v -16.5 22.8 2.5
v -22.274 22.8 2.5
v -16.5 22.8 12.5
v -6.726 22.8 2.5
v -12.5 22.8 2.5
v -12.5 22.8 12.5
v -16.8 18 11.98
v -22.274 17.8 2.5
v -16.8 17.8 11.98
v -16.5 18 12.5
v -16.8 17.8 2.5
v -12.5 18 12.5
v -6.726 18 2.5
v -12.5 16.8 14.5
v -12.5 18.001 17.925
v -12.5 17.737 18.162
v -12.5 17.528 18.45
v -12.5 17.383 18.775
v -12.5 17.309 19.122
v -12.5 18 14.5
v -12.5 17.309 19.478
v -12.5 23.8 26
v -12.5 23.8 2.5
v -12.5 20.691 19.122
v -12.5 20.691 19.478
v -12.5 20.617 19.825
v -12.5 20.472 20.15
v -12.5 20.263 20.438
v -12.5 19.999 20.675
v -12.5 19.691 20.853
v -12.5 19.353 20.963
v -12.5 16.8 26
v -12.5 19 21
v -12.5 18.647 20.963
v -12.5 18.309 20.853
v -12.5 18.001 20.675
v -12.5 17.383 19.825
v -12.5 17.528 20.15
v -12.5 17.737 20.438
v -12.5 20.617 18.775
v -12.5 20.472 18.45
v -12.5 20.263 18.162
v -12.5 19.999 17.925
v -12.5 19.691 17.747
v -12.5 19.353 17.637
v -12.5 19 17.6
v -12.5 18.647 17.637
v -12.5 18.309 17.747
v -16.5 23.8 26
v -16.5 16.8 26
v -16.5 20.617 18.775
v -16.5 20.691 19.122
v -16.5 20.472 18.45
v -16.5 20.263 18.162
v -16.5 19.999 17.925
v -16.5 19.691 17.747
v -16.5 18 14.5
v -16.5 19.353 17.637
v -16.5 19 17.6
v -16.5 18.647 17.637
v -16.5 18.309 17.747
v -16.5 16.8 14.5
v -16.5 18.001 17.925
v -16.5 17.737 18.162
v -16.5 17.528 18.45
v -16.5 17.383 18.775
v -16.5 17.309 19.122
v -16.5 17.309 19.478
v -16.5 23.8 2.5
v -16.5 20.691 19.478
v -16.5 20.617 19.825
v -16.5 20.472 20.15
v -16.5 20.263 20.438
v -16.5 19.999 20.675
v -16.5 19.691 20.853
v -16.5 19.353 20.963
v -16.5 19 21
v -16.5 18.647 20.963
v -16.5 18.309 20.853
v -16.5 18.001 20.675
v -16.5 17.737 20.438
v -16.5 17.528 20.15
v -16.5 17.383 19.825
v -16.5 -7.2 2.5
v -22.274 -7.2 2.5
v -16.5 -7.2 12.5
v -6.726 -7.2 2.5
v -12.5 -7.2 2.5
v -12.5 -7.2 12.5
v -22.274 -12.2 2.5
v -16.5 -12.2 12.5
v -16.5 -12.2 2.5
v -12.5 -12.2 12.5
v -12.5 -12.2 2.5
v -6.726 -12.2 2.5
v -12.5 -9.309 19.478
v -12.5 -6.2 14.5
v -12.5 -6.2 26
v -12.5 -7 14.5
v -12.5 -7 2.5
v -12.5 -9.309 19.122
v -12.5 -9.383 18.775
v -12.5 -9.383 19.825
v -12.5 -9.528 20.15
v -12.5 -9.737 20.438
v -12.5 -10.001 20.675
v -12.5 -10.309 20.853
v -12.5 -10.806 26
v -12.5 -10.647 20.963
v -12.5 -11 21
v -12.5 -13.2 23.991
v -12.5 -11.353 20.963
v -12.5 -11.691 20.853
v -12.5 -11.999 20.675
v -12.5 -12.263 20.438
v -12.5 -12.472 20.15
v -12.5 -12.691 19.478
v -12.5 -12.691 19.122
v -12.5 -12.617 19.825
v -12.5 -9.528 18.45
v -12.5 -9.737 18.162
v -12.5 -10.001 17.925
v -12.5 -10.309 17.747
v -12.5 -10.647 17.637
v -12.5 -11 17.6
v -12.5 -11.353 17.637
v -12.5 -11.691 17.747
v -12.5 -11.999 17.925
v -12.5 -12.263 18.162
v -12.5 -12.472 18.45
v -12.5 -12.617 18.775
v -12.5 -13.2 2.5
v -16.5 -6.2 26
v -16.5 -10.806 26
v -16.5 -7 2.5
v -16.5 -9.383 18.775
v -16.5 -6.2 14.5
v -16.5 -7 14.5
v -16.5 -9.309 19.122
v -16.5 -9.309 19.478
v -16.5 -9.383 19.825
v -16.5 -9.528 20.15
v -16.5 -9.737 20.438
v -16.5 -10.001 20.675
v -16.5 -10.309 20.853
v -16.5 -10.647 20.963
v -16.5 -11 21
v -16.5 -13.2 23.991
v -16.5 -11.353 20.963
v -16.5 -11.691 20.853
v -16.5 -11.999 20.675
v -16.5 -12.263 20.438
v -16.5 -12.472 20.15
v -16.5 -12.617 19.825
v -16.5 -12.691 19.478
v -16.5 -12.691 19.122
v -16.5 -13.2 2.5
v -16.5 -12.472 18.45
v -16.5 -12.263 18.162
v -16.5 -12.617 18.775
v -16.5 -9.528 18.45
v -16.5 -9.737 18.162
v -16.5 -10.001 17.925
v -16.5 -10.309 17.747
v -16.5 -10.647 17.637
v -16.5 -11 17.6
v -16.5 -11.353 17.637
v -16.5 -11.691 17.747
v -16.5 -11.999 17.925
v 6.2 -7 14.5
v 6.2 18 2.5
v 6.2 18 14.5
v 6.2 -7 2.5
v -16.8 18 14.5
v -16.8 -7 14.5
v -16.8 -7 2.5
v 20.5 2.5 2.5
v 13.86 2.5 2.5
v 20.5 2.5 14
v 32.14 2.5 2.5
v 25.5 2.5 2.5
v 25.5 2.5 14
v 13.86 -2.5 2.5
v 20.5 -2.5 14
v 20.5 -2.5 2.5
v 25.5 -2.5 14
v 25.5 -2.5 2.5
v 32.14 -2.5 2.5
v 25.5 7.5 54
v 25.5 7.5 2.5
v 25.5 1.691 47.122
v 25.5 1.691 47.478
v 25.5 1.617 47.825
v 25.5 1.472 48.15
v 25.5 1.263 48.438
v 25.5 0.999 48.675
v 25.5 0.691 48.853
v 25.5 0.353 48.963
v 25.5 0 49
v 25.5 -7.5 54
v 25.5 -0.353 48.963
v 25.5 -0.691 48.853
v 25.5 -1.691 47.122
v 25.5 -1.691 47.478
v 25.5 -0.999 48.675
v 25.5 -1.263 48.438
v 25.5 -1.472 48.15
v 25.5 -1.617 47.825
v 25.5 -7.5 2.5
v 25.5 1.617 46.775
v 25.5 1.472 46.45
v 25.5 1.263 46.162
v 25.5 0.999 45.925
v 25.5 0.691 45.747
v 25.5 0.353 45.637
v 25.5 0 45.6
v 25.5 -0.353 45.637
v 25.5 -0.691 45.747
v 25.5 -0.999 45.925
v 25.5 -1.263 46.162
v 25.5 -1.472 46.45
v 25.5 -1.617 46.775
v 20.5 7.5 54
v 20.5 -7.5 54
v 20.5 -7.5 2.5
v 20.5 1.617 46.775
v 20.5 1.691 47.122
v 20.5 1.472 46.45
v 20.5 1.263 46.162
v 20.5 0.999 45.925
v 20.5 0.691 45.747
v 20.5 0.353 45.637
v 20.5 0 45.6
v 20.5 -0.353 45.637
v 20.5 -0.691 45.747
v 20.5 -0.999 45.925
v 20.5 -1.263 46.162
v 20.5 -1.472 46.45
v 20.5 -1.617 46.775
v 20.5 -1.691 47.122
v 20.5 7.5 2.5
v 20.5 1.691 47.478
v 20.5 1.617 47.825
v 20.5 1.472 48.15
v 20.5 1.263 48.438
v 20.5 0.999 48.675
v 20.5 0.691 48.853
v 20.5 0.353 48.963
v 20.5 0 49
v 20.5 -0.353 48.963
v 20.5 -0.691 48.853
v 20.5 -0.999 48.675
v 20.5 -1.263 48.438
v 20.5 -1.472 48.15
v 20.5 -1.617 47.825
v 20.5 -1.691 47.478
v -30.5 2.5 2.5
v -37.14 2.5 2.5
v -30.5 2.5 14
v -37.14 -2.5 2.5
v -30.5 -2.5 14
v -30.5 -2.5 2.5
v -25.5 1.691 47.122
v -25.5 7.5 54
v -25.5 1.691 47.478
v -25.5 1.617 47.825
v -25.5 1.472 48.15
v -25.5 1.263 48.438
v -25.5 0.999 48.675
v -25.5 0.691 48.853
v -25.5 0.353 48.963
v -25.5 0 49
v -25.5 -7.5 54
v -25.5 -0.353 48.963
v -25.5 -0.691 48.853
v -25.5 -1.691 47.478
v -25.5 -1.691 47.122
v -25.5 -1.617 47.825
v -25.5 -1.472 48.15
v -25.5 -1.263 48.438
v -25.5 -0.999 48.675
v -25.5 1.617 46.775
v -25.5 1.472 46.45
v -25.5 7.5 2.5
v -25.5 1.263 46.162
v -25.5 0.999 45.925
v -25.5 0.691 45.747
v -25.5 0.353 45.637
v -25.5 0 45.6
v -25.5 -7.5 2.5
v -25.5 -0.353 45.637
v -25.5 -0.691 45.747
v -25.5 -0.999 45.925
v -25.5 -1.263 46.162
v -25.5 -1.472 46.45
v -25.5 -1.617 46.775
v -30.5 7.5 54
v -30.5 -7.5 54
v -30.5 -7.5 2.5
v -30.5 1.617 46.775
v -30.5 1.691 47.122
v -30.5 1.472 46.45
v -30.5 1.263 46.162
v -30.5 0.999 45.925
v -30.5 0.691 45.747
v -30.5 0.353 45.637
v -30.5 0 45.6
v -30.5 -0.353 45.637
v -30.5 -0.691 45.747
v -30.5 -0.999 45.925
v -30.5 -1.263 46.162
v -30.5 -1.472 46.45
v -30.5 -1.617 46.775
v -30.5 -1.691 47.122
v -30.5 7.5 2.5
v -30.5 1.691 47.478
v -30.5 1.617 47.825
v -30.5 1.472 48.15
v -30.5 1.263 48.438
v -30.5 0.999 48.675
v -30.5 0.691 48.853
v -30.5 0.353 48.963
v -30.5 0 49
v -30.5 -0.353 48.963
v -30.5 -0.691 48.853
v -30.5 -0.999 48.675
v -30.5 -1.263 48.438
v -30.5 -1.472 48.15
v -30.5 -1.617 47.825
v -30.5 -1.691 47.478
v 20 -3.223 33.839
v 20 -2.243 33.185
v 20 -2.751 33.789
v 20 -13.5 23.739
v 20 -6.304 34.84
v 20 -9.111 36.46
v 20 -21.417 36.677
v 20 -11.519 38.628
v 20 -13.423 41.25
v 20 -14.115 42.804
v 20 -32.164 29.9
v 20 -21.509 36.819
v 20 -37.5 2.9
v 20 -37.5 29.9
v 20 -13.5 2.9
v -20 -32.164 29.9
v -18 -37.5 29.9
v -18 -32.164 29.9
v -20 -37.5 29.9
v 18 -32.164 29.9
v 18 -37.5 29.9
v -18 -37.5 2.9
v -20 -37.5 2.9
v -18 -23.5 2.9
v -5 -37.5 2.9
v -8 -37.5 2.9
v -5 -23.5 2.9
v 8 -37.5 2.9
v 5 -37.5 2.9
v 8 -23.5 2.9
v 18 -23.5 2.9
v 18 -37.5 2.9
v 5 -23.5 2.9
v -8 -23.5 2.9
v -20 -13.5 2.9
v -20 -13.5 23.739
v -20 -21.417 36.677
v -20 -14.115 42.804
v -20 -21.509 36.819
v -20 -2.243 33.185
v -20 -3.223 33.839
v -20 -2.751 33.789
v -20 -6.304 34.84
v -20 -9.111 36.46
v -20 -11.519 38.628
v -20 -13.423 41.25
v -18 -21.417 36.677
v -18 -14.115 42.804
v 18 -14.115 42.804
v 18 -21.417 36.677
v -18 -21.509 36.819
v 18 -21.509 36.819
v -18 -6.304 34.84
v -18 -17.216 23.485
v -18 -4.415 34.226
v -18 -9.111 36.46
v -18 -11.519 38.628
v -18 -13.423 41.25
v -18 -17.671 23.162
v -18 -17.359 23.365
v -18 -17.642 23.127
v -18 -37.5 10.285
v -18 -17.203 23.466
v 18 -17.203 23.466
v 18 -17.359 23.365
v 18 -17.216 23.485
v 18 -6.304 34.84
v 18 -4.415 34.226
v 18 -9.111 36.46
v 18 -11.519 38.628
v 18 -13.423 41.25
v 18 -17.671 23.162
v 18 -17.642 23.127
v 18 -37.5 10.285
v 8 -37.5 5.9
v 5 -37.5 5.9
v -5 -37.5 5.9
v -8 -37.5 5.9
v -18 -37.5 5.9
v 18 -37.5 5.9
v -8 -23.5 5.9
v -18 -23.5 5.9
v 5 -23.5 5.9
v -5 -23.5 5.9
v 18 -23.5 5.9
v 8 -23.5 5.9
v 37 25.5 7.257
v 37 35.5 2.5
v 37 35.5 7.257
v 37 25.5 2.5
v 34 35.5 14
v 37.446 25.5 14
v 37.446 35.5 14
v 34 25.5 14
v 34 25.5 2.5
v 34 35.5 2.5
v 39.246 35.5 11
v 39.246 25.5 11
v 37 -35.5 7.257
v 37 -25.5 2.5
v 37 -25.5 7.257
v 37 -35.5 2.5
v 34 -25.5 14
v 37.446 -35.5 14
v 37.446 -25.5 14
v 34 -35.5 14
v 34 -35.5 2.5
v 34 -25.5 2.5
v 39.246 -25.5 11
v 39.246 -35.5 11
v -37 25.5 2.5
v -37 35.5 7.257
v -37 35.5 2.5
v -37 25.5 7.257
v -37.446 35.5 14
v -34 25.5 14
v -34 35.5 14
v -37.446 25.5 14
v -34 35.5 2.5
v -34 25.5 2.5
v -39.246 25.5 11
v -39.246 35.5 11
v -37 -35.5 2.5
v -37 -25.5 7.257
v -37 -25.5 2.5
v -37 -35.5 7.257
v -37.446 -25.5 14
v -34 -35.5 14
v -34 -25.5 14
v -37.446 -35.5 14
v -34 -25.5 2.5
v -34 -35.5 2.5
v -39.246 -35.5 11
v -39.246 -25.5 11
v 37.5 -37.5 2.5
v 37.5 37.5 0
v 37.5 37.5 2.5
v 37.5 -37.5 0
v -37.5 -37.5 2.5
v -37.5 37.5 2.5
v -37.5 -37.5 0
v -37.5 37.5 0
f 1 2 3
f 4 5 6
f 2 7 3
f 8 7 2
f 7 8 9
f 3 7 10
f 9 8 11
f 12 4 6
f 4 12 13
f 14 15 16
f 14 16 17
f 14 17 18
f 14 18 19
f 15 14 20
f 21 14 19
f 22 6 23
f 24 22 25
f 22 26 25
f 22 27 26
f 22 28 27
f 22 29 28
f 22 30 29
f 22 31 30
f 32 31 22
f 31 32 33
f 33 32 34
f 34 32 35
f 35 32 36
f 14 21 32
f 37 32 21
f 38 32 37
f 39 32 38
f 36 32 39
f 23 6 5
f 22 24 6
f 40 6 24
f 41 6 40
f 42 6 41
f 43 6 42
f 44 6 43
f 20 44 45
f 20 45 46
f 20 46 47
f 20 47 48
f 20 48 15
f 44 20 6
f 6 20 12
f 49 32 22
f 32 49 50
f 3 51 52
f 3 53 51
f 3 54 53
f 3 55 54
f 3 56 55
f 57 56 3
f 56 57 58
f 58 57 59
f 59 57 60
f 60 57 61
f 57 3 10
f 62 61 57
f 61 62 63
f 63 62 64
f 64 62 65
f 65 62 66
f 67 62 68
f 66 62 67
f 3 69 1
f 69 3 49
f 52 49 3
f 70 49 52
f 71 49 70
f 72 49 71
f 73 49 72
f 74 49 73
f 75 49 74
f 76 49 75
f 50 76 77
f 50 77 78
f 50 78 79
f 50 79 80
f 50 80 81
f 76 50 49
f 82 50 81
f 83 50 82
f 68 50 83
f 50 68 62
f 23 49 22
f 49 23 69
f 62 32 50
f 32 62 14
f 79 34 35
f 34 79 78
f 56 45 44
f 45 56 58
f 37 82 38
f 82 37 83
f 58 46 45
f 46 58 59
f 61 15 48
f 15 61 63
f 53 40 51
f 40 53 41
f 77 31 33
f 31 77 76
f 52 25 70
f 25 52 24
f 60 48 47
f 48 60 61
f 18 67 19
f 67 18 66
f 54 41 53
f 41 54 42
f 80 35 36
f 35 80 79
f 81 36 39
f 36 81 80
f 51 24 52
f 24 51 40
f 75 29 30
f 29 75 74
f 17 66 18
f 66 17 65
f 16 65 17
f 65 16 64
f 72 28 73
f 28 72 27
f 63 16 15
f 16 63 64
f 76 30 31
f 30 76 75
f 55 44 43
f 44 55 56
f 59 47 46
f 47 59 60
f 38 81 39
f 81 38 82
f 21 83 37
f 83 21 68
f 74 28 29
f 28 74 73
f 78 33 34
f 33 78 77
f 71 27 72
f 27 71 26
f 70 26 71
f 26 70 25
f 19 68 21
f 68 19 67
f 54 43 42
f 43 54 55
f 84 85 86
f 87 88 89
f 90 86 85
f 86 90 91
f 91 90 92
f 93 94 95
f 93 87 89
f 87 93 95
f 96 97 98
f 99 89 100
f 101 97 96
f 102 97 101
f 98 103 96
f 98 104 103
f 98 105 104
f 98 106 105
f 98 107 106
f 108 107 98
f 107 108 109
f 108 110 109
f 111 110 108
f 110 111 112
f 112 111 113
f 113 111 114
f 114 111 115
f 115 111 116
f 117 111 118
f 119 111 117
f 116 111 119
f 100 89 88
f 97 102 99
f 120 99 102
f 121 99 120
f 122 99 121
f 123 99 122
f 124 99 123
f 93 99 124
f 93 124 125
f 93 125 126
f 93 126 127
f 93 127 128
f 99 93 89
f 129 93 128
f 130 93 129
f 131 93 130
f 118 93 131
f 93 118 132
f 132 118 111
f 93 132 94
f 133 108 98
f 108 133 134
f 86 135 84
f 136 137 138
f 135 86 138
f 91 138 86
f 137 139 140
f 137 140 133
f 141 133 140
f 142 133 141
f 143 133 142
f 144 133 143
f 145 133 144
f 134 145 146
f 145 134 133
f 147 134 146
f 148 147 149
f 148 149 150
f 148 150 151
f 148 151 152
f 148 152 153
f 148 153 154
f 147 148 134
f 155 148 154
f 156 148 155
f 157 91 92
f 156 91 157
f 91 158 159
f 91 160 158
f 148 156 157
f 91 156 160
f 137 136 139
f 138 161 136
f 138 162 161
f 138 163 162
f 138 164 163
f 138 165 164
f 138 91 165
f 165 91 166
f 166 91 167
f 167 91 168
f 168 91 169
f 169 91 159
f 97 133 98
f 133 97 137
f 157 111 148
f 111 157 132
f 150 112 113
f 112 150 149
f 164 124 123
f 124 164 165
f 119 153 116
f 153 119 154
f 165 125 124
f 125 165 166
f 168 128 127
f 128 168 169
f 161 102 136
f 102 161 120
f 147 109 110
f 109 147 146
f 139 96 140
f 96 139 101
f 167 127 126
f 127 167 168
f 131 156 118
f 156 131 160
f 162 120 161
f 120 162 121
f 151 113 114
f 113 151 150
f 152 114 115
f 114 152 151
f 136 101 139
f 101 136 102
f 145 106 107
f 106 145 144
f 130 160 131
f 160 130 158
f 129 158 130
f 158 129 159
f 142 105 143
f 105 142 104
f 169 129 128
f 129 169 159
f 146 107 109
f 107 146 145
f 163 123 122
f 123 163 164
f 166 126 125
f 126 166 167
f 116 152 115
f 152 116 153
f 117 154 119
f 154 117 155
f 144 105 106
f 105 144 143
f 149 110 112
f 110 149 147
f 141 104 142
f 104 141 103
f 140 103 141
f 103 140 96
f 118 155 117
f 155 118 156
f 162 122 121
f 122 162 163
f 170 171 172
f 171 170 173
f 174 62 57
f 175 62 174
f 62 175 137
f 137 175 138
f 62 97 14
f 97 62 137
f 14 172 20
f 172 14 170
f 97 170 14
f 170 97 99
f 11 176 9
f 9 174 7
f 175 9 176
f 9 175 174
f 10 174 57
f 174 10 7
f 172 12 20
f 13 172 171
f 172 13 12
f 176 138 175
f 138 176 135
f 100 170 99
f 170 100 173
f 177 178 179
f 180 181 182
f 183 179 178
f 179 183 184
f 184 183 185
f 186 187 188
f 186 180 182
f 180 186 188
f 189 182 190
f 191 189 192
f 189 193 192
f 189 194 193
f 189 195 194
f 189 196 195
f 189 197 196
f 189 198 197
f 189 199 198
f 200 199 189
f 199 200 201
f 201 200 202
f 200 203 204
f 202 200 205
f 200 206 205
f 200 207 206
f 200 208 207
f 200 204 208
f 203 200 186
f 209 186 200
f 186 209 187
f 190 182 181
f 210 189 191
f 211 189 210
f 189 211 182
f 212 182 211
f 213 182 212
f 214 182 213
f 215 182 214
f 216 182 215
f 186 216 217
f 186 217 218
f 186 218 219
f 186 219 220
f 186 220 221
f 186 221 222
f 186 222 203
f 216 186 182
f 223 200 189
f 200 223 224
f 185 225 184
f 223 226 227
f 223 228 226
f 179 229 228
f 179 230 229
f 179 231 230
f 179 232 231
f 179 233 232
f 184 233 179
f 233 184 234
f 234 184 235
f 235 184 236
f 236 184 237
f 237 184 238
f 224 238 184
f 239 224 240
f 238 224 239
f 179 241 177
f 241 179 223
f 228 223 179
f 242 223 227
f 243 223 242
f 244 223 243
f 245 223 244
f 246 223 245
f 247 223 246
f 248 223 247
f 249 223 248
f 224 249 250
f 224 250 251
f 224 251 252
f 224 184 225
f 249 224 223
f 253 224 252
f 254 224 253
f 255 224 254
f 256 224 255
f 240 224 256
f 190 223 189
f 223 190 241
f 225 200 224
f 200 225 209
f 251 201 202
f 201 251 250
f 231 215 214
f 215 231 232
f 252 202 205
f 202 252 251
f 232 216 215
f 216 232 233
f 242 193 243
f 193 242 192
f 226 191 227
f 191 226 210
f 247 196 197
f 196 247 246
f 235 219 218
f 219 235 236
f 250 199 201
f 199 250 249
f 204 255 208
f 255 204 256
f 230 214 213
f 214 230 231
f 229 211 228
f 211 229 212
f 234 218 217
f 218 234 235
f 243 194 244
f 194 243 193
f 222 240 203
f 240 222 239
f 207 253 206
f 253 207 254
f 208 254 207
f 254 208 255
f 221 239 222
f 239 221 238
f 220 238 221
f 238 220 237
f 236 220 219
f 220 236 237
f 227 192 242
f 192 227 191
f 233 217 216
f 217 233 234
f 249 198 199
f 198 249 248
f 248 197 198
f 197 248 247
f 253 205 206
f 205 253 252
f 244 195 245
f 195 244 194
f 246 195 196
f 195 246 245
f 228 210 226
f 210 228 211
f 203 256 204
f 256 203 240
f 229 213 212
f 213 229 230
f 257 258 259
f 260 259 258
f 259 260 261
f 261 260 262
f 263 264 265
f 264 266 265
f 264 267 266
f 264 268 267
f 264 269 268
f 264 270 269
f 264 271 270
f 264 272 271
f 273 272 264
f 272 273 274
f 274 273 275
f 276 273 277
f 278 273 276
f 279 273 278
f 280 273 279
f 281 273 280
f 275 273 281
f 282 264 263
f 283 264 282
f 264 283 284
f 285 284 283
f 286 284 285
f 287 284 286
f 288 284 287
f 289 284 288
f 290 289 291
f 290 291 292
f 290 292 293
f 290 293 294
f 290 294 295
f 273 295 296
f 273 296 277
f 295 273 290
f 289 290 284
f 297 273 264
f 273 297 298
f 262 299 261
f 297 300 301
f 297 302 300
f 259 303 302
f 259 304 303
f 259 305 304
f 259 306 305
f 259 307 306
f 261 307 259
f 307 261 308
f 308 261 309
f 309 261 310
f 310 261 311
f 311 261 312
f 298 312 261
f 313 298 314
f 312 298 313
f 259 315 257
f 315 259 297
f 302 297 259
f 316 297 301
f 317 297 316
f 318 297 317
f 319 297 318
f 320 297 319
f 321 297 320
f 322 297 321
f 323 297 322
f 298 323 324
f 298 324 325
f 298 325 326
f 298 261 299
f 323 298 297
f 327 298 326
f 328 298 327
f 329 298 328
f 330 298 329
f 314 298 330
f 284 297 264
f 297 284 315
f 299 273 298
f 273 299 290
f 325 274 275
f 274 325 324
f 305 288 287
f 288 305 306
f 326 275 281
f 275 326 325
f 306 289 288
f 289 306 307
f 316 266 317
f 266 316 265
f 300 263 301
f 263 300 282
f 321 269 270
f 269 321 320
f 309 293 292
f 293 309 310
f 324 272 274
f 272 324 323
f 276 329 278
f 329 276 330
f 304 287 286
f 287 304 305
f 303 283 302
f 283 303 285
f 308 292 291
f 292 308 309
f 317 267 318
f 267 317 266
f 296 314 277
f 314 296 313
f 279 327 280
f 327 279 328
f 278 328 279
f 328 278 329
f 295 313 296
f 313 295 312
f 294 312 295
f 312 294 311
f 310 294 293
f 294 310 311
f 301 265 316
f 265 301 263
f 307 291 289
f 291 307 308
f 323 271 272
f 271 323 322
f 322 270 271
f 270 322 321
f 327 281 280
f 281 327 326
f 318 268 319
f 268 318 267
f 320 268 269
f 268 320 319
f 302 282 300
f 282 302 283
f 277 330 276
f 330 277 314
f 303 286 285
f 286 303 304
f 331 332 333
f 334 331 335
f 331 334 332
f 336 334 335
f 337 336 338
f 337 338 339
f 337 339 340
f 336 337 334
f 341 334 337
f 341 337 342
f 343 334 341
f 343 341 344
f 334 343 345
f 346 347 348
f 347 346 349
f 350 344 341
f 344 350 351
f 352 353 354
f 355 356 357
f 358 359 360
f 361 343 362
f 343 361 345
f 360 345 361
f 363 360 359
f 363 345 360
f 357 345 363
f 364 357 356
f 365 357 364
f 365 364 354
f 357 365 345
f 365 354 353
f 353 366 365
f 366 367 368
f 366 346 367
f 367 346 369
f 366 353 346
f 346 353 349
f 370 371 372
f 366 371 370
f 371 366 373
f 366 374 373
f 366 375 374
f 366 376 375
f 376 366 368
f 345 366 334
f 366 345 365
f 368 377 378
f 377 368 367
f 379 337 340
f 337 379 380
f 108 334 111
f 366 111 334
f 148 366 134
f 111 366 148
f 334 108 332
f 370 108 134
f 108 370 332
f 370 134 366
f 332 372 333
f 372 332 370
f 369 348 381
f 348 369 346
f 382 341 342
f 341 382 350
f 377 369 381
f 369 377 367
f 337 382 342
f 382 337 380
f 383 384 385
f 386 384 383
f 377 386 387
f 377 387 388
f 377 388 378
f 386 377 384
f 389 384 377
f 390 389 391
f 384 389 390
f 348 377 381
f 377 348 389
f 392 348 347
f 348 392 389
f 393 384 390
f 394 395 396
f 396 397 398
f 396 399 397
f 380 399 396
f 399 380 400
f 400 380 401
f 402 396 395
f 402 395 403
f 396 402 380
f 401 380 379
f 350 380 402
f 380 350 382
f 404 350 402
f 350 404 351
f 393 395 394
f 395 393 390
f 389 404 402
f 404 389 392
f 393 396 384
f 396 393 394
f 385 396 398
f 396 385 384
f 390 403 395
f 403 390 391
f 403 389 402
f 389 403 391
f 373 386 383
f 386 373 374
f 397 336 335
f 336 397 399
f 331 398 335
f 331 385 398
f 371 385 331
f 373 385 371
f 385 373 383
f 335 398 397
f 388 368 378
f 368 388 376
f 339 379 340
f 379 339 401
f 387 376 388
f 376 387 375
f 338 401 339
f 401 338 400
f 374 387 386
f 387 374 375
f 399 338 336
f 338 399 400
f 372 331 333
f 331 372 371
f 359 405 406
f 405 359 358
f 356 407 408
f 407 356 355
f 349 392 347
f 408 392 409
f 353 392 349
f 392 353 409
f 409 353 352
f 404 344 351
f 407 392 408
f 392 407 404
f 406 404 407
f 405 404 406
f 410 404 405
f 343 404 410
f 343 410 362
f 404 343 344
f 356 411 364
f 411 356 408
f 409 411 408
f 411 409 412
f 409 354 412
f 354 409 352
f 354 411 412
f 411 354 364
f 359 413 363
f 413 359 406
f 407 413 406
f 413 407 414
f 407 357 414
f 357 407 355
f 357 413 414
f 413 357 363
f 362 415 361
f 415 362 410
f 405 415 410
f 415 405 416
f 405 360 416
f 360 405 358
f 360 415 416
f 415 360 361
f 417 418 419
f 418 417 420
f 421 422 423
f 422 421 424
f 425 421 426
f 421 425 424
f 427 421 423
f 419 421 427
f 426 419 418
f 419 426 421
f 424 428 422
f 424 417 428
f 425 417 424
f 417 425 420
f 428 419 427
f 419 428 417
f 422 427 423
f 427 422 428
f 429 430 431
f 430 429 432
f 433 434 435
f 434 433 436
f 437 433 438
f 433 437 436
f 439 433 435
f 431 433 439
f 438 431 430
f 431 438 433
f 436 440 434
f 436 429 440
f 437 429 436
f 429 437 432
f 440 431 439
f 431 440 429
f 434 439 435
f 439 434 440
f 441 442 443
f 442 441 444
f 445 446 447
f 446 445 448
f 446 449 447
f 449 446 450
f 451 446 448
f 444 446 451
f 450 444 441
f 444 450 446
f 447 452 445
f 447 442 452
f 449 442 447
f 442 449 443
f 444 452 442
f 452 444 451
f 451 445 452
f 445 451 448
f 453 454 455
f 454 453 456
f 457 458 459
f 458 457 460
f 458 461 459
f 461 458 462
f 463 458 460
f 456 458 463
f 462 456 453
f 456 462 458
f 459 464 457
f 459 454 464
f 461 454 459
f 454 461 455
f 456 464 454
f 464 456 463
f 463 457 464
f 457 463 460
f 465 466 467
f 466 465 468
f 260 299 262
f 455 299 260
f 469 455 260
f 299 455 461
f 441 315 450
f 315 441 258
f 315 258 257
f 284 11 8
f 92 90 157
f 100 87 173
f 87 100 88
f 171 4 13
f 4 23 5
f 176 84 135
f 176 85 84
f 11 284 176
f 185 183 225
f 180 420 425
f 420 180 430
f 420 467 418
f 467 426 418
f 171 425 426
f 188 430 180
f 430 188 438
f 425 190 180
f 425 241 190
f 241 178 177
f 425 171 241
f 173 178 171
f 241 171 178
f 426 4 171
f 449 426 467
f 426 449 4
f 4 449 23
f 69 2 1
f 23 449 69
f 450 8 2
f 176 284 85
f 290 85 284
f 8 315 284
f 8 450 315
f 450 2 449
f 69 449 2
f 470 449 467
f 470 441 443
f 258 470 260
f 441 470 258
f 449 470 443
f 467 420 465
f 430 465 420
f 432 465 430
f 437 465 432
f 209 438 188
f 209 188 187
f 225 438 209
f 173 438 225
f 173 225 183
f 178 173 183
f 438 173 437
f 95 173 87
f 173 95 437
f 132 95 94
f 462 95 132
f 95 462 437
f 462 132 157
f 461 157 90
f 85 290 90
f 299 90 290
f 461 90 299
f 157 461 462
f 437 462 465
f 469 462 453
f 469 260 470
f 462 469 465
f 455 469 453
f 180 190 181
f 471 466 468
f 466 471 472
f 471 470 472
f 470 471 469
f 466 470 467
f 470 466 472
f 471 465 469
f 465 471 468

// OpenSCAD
use <MCAD/involute_gears.scad>
use <MCAD/servos.scad>

module tube(diameter, length) {
  radius = diameter / 2;
  linear_extrude(height = length)
  circle(r = radius);
}

module screwCutout(shaftDiameter, shaftLength, headDiameter, headLength) {
  union() {
    tube(shaftDiameter, shaftLength+0.1);
    translate([0,0,shaftLength])
    tube(headDiameter, headLength);
  }
}

module m3Cutout(length) {
  screwCutout(3.4, length, 6, 14);
}

module gearFixationBolts(scaleFactor = 1){
  boltDiameter = 16.5;
  boltLength = 2.5+0.1;

  color("red")
  translate([0,0,-0.1])
  difference(){
    scale(scaleFactor)
    tube(boltDiameter, boltLength+0.1);

    union(){
      scale(1/scaleFactor)
      translate([0,0,-2*boltLength])
      tube(8, boltLength*5);
      translate([0,-boltDiameter,-2*boltLength])
      cube([2*boltDiameter, 2*boltDiameter, 5*boltLength]);

    }
  }
}

module gearFixationBolts2(scaleFactor = 1){
  boltDiameter = 4.25;
  boltLength = 2.5;

  color("red")
  translate([0,0,-0.1])
  for (a =[0:90:360]) {
    rotate([0,0,a]) {
      translate([0,5.5,0])
      scale(scaleFactor)
      tube(boltDiameter, boltLength+0.1);
    }
  }
}

module candyGear(thickness = 5, bolts=false, bore_diameter = 3.6) {
  gearThickness = thickness - 0.4;
  teeth          = 12;
  circular_pitch = pitchRadius * 30;
  translate([0,0,-0.2])
  union() {
    gear (
        number_of_teeth = teeth,
        circular_pitch  = circular_pitch,
        backlash        = 0.7,
        bore_diameter   = bore_diameter,
        hub_thickness   = gearThickness,
        gear_thickness  = gearThickness,
        rim_thickness   = gearThickness,
        rim_width       = 5,
        circles = 4

    );
    if(bolts == true){
      translate([0,0,gearThickness])
      rotate([0,0,180])
      gearFixationBolts(1);
    }
  }
}

module servoGear(bore, hub) {
  teeth          = 12;
  circular_pitch = pitchRadius * 30;
  thickness = 4;
  difference(){
    gear (
        number_of_teeth = teeth,
        circular_pitch  = circular_pitch,
        backlash        = 0.7,
        bore_diameter   = bore,
        hub_diameter    = 8,
        hub_thickness   = thickness+1,
        gear_thickness  = thickness,
        rim_thickness   = thickness,
        rim_width       = 30,
        circles = 0

    );
    translate([0,0,thickness-1.5
      ])
    tube(hub, 5);
    translate([0,0,-4.0])
    tube(5, 5);
  }
}

module candyPortioner(diameter, length) {
  radius = diameter / 2;

  rotate([0,90,0]) {
    difference() {
      difference(){
        difference() {
          cutoutSize = (length/2) - 4;
          insetDepth = 3;
          cutoutHeight = radius + insetDepth + 1;
          tube(diameter, length);
          translate([insetDepth,0,0])
          translate([0,0,length/2])
          scale([1,(diameter/length),1])
          rotate([90,0,-90])
          rotate([0,0,45])
          cylinder(h = cutoutHeight, r1 = cutoutSize-5, r2 = cutoutSize+10, $fn = 4);
          translate([(diameter/2)-2, -diameter,-length/2])
          cube([10, diameter *2, length *2]);
        }
        gearFixationBolts(1.08);

      }
      color("white") {
        shaftLength = 25;
        translate([0,0,-shaftLength+3])
        m3Cutout(shaftLength);
        rotate([0,180,0])
        translate([0,0,-length-shaftLength+3])
        m3Cutout(shaftLength);
      }
    }
  }
}

module supportStrut(thickness, width, height, singleSupport, singleSupport = false) {
  strutHeight = min(width, 8);
  translate([-thickness/2, -width/2,0])
  union(){
    cube([thickness,width,height]);
    difference() {
      translate([0,(width-5)/2,strutHeight/2])
      rotate([0,-90,0])
      rotate([-90,0,0])
      union(){
        translate([0,0,0])
        cylinder(5,strutHeight,strutHeight,$fn=3);
        translate([0,thickness,0])
        cylinder(5,strutHeight,strutHeight,$fn=3);

      }
      if(singleSupport == true) {
        translate([thickness/2,-width/2,-height/2])
        cube([width*2,width*2,height*2]);
      }
    }
  }
}

module supportStrutWithHole(thickness, width, height, diameter, holeHeight, offsetFromCenter = 0, singleSupport = false) {
  difference(){
    supportStrut(thickness, width, height, singleSupport);
    translate([-thickness,offsetFromCenter,holeHeight-(diameter/2)])
    rotate([0,90,0])
    tube(diameter, 2*thickness);
  }
}

module servoStrut(thickness, width, height, diameter, holeHeight, offsetFromCenter = 0, singleSupport = false) {
  servoThickness = 2.8;
  difference(){
    supportStrutWithHole(thickness, width, height, diameter, holeHeight, offsetFromCenter, singleSupport);
    translate([-servoThickness/2,-width,holeHeight-5])
    cube([servoThickness,2*width, height]);
  }
}

module caseHook(){
  height = 12;
  width = 10;
  strength = 3;
  hookWidth = 6;
  difference(){
    union() {
      translate([-strength/2, -width/2, 0])
      cube([strength,width, height]);
      color("red")
      translate([hookWidth/5,0,height-(hookWidth/2)])
      scale([0.6,1,1])
      rotate([0,45,0])
      cube([hookWidth,width,hookWidth], center=true);
    }
    color("lime")
    translate([-strength, -width, height])
    cube([strength*2,width*2, height]);
    color("purple")
    translate([strength*-2.5, -width,0])
    cube([strength*2,width*2, height]);
  }
}


module basePlate() {
  translate([-37.5,-37.5,0])
  union(){
    cube([75,75,2.5]);
    translate([0,0,2]){

      translate([-2.5,-2.5,0]){
        union(){
          /*translate([26.7,30.3,0])
          servoStrut(7,7,servoHeight+3, diameter=3.4, holeHeight=servoHeight, offsetFromCenter=1.3);

          translate([26.7,60.3,0])
          servoStrut(7,7,servoHeight+3, diameter=3.4, holeHeight=servoHeight, offsetFromCenter=-1.3);*/

          translate([25.5,0,0]){
            translate([0,60.3,0])
            supportStrutWithHole(4,7,servoHeight+5, diameter=3.4, holeHeight=servoHeight, offsetFromCenter=-1.3);
            translate([0,30.3,0])
            supportStrutWithHole(4,7,servoHeight+5, diameter=3.4, holeHeight=servoHeight, offsetFromCenter=-1.3);

          }

          translate([23.2,33,0])
          cube([23,25,servoHeight-6.5]);

        }

        translate([63,40,0])
        supportStrutWithHole(5,15,dispenserHeigth+5, diameter=3.4, holeHeight=dispenserHeigth);

        translate([12,40,0])
        supportStrutWithHole(5,15,dispenserHeigth+5, diameter=3.4, holeHeight=dispenserHeigth, singleSupport = true);
      }

      chuteWidth = 36;
      chuteStrength =2;
      chuteHeight = 15;
      translate([37.5-chuteWidth/2,0,0.9])
      difference(){
        union(){
          difference() {
            difference() {
              difference(){
                translate([-chuteStrength,-1,0])
                union(){
                  color("lime")
                  cube([chuteWidth+2*chuteStrength,25,27]);
                  color("red")
                  translate([0,24,20])
                  rotate([40,0,0])
                  cube([chuteWidth+2*chuteStrength,16,chuteHeight]);
                  translate([0,0,5])
                  rotate([33,0,0])
                  cube([chuteWidth+2*chuteStrength,30,chuteHeight]);
                }
                translate([0,0,5])
                union(){
                  color("purple")
                  rotate([33,0,0])
                  translate([0,-10,chuteStrength])
                  cube([chuteWidth,35.5,chuteHeight+10]);
                  color("green")
                  rotate([40,0,0])
                  translate([0,25,chuteStrength-3.1])
                  cube([chuteWidth,80,chuteHeight+10]);
                }
              }
              color("blue")
              translate([-20,37.5,dispenserHeigth-0.9])
              rotate([0,90,0])
              tube(dispenserDiameter+1,80);
            }
            color("red")
            translate([-5,-40,-5])
            cube([chuteWidth+10,40,80]);
          }
        }
        color("blue")
        translate([0,-1,0]) {
          cube([10,15,3]);
          translate([13,0,0])
          cube([10,15,3]);
          translate([26,0,0])
          cube([10,15,3]);

        }
      }

      translate([73,68,0])
      caseHook();
      translate([73,7,0])
      caseHook();
      translate([2,68,0])
      rotate([0,0,180])
      caseHook();
      translate([2,7,0])
      rotate([0,0,180])
      caseHook();
    }
  }
}

module all(){
  rotation = maxRotation * 2 * abs($t-0.5);

  translate([-20,0,dispenserHeigth])
  rotate([rotation,0,0])
  color("maroon")
  candyPortioner(dispenserDiameter, 40);

  translate([-25,0,dispenserHeigth])
  rotate([180,0,0])
  rotate([rotation,0,0]){
    rotate([0,90,0])
    color("green")
    candyGear(bolts=true);

  }

  translate([-25,0,servoHeight])
  rotate([-rotation,0,0]){
    rotate([0,90,0])
    rotate([0,0,15])
    color("blue")
    servoGear(3.0, 4.65);
  }

  translate([7,0,servoHeight])
  rotate([0,270,0])
  color("purple")
  alignds420(screws=1);

  color("grey")
  basePlate();

  /*translate([-37.5,37.5,0])
  cube([75,1,80]);
  translate([-37.5,-37.5,80])
  cube([75,75,1]);*/
}

$fn = 30;
pitchRadius = 14;
servoHeight = pitchRadius+5;
dispenserHeigth = 2*pitchRadius+servoHeight;
maxRotation = 116;
//$t = 1;
dispenserDiameter = 30;

//all();
//candyPortioner(dispenserDiameter, 40);
basePlate();
//candyGear(bolts=true);
//servoGear(3.0, 4.65);
